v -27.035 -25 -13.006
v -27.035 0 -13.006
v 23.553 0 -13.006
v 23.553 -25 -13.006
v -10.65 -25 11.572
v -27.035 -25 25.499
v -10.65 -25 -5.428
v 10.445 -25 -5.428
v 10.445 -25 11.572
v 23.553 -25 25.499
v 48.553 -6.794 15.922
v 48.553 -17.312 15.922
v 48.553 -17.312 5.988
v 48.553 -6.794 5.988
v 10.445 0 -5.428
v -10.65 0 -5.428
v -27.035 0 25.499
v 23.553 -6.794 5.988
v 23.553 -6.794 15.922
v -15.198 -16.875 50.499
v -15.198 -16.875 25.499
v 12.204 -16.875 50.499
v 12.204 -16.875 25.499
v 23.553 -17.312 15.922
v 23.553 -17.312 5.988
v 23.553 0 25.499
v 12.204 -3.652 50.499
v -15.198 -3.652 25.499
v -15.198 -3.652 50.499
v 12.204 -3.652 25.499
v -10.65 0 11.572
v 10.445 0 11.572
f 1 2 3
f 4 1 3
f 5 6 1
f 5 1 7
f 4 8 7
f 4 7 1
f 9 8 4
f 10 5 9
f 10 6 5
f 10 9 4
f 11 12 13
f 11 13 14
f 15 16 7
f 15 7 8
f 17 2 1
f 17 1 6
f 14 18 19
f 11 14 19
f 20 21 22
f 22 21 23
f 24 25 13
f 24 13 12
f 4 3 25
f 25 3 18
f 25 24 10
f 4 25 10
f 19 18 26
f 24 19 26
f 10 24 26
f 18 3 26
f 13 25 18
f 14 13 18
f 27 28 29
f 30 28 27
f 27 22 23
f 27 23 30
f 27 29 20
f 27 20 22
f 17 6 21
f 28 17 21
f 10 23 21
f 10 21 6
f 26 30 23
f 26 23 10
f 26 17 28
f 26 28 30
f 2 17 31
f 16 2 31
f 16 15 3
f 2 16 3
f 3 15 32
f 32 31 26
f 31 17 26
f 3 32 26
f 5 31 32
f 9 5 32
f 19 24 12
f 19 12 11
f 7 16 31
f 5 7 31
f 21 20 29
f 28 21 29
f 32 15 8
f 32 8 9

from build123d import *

# Parameters (mm, degrees)
F0_W     = 50.588429
F0_H     = 38.504552
F0_W_2   = 21.09558
F0_H_2   = 16.999349
F1_DEPTH = 25
F2_W     = 27.401078
F2_H     = 13.22294
F3_DEPTH = 25
F4_W     = 10.518003
F4_H     = 9.934522
F5_DEPTH = 25


with BuildPart() as f1:
    # F0 (on Front) → F1 (new body)
    with BuildSketch(Plane.XZ):
        with Locations((-1.740897, 6.246749)):
            Rectangle(F0_W, F0_H)
        with Locations((-0.102405, 3.072171)):
            Rectangle(F0_W_2, F0_H_2, mode=Mode.SUBTRACT)
    extrude(amount=F1_DEPTH)

    # F2 (on face) → F3 (join)
    with BuildSketch(Plane.XY.offset(25.499025)):
        with Locations((-1.496977, -10.263078)):
            Rectangle(F2_W, F2_H)
    extrude(amount=F3_DEPTH)

    # F4 (on face) → F5 (join)
    with BuildSketch(Plane.YZ.offset(23.553317)):
        with Locations((-12.053044, 10.954987)):
            Rectangle(F4_W, F4_H)
    extrude(amount=F5_DEPTH)


solid = f1.part
